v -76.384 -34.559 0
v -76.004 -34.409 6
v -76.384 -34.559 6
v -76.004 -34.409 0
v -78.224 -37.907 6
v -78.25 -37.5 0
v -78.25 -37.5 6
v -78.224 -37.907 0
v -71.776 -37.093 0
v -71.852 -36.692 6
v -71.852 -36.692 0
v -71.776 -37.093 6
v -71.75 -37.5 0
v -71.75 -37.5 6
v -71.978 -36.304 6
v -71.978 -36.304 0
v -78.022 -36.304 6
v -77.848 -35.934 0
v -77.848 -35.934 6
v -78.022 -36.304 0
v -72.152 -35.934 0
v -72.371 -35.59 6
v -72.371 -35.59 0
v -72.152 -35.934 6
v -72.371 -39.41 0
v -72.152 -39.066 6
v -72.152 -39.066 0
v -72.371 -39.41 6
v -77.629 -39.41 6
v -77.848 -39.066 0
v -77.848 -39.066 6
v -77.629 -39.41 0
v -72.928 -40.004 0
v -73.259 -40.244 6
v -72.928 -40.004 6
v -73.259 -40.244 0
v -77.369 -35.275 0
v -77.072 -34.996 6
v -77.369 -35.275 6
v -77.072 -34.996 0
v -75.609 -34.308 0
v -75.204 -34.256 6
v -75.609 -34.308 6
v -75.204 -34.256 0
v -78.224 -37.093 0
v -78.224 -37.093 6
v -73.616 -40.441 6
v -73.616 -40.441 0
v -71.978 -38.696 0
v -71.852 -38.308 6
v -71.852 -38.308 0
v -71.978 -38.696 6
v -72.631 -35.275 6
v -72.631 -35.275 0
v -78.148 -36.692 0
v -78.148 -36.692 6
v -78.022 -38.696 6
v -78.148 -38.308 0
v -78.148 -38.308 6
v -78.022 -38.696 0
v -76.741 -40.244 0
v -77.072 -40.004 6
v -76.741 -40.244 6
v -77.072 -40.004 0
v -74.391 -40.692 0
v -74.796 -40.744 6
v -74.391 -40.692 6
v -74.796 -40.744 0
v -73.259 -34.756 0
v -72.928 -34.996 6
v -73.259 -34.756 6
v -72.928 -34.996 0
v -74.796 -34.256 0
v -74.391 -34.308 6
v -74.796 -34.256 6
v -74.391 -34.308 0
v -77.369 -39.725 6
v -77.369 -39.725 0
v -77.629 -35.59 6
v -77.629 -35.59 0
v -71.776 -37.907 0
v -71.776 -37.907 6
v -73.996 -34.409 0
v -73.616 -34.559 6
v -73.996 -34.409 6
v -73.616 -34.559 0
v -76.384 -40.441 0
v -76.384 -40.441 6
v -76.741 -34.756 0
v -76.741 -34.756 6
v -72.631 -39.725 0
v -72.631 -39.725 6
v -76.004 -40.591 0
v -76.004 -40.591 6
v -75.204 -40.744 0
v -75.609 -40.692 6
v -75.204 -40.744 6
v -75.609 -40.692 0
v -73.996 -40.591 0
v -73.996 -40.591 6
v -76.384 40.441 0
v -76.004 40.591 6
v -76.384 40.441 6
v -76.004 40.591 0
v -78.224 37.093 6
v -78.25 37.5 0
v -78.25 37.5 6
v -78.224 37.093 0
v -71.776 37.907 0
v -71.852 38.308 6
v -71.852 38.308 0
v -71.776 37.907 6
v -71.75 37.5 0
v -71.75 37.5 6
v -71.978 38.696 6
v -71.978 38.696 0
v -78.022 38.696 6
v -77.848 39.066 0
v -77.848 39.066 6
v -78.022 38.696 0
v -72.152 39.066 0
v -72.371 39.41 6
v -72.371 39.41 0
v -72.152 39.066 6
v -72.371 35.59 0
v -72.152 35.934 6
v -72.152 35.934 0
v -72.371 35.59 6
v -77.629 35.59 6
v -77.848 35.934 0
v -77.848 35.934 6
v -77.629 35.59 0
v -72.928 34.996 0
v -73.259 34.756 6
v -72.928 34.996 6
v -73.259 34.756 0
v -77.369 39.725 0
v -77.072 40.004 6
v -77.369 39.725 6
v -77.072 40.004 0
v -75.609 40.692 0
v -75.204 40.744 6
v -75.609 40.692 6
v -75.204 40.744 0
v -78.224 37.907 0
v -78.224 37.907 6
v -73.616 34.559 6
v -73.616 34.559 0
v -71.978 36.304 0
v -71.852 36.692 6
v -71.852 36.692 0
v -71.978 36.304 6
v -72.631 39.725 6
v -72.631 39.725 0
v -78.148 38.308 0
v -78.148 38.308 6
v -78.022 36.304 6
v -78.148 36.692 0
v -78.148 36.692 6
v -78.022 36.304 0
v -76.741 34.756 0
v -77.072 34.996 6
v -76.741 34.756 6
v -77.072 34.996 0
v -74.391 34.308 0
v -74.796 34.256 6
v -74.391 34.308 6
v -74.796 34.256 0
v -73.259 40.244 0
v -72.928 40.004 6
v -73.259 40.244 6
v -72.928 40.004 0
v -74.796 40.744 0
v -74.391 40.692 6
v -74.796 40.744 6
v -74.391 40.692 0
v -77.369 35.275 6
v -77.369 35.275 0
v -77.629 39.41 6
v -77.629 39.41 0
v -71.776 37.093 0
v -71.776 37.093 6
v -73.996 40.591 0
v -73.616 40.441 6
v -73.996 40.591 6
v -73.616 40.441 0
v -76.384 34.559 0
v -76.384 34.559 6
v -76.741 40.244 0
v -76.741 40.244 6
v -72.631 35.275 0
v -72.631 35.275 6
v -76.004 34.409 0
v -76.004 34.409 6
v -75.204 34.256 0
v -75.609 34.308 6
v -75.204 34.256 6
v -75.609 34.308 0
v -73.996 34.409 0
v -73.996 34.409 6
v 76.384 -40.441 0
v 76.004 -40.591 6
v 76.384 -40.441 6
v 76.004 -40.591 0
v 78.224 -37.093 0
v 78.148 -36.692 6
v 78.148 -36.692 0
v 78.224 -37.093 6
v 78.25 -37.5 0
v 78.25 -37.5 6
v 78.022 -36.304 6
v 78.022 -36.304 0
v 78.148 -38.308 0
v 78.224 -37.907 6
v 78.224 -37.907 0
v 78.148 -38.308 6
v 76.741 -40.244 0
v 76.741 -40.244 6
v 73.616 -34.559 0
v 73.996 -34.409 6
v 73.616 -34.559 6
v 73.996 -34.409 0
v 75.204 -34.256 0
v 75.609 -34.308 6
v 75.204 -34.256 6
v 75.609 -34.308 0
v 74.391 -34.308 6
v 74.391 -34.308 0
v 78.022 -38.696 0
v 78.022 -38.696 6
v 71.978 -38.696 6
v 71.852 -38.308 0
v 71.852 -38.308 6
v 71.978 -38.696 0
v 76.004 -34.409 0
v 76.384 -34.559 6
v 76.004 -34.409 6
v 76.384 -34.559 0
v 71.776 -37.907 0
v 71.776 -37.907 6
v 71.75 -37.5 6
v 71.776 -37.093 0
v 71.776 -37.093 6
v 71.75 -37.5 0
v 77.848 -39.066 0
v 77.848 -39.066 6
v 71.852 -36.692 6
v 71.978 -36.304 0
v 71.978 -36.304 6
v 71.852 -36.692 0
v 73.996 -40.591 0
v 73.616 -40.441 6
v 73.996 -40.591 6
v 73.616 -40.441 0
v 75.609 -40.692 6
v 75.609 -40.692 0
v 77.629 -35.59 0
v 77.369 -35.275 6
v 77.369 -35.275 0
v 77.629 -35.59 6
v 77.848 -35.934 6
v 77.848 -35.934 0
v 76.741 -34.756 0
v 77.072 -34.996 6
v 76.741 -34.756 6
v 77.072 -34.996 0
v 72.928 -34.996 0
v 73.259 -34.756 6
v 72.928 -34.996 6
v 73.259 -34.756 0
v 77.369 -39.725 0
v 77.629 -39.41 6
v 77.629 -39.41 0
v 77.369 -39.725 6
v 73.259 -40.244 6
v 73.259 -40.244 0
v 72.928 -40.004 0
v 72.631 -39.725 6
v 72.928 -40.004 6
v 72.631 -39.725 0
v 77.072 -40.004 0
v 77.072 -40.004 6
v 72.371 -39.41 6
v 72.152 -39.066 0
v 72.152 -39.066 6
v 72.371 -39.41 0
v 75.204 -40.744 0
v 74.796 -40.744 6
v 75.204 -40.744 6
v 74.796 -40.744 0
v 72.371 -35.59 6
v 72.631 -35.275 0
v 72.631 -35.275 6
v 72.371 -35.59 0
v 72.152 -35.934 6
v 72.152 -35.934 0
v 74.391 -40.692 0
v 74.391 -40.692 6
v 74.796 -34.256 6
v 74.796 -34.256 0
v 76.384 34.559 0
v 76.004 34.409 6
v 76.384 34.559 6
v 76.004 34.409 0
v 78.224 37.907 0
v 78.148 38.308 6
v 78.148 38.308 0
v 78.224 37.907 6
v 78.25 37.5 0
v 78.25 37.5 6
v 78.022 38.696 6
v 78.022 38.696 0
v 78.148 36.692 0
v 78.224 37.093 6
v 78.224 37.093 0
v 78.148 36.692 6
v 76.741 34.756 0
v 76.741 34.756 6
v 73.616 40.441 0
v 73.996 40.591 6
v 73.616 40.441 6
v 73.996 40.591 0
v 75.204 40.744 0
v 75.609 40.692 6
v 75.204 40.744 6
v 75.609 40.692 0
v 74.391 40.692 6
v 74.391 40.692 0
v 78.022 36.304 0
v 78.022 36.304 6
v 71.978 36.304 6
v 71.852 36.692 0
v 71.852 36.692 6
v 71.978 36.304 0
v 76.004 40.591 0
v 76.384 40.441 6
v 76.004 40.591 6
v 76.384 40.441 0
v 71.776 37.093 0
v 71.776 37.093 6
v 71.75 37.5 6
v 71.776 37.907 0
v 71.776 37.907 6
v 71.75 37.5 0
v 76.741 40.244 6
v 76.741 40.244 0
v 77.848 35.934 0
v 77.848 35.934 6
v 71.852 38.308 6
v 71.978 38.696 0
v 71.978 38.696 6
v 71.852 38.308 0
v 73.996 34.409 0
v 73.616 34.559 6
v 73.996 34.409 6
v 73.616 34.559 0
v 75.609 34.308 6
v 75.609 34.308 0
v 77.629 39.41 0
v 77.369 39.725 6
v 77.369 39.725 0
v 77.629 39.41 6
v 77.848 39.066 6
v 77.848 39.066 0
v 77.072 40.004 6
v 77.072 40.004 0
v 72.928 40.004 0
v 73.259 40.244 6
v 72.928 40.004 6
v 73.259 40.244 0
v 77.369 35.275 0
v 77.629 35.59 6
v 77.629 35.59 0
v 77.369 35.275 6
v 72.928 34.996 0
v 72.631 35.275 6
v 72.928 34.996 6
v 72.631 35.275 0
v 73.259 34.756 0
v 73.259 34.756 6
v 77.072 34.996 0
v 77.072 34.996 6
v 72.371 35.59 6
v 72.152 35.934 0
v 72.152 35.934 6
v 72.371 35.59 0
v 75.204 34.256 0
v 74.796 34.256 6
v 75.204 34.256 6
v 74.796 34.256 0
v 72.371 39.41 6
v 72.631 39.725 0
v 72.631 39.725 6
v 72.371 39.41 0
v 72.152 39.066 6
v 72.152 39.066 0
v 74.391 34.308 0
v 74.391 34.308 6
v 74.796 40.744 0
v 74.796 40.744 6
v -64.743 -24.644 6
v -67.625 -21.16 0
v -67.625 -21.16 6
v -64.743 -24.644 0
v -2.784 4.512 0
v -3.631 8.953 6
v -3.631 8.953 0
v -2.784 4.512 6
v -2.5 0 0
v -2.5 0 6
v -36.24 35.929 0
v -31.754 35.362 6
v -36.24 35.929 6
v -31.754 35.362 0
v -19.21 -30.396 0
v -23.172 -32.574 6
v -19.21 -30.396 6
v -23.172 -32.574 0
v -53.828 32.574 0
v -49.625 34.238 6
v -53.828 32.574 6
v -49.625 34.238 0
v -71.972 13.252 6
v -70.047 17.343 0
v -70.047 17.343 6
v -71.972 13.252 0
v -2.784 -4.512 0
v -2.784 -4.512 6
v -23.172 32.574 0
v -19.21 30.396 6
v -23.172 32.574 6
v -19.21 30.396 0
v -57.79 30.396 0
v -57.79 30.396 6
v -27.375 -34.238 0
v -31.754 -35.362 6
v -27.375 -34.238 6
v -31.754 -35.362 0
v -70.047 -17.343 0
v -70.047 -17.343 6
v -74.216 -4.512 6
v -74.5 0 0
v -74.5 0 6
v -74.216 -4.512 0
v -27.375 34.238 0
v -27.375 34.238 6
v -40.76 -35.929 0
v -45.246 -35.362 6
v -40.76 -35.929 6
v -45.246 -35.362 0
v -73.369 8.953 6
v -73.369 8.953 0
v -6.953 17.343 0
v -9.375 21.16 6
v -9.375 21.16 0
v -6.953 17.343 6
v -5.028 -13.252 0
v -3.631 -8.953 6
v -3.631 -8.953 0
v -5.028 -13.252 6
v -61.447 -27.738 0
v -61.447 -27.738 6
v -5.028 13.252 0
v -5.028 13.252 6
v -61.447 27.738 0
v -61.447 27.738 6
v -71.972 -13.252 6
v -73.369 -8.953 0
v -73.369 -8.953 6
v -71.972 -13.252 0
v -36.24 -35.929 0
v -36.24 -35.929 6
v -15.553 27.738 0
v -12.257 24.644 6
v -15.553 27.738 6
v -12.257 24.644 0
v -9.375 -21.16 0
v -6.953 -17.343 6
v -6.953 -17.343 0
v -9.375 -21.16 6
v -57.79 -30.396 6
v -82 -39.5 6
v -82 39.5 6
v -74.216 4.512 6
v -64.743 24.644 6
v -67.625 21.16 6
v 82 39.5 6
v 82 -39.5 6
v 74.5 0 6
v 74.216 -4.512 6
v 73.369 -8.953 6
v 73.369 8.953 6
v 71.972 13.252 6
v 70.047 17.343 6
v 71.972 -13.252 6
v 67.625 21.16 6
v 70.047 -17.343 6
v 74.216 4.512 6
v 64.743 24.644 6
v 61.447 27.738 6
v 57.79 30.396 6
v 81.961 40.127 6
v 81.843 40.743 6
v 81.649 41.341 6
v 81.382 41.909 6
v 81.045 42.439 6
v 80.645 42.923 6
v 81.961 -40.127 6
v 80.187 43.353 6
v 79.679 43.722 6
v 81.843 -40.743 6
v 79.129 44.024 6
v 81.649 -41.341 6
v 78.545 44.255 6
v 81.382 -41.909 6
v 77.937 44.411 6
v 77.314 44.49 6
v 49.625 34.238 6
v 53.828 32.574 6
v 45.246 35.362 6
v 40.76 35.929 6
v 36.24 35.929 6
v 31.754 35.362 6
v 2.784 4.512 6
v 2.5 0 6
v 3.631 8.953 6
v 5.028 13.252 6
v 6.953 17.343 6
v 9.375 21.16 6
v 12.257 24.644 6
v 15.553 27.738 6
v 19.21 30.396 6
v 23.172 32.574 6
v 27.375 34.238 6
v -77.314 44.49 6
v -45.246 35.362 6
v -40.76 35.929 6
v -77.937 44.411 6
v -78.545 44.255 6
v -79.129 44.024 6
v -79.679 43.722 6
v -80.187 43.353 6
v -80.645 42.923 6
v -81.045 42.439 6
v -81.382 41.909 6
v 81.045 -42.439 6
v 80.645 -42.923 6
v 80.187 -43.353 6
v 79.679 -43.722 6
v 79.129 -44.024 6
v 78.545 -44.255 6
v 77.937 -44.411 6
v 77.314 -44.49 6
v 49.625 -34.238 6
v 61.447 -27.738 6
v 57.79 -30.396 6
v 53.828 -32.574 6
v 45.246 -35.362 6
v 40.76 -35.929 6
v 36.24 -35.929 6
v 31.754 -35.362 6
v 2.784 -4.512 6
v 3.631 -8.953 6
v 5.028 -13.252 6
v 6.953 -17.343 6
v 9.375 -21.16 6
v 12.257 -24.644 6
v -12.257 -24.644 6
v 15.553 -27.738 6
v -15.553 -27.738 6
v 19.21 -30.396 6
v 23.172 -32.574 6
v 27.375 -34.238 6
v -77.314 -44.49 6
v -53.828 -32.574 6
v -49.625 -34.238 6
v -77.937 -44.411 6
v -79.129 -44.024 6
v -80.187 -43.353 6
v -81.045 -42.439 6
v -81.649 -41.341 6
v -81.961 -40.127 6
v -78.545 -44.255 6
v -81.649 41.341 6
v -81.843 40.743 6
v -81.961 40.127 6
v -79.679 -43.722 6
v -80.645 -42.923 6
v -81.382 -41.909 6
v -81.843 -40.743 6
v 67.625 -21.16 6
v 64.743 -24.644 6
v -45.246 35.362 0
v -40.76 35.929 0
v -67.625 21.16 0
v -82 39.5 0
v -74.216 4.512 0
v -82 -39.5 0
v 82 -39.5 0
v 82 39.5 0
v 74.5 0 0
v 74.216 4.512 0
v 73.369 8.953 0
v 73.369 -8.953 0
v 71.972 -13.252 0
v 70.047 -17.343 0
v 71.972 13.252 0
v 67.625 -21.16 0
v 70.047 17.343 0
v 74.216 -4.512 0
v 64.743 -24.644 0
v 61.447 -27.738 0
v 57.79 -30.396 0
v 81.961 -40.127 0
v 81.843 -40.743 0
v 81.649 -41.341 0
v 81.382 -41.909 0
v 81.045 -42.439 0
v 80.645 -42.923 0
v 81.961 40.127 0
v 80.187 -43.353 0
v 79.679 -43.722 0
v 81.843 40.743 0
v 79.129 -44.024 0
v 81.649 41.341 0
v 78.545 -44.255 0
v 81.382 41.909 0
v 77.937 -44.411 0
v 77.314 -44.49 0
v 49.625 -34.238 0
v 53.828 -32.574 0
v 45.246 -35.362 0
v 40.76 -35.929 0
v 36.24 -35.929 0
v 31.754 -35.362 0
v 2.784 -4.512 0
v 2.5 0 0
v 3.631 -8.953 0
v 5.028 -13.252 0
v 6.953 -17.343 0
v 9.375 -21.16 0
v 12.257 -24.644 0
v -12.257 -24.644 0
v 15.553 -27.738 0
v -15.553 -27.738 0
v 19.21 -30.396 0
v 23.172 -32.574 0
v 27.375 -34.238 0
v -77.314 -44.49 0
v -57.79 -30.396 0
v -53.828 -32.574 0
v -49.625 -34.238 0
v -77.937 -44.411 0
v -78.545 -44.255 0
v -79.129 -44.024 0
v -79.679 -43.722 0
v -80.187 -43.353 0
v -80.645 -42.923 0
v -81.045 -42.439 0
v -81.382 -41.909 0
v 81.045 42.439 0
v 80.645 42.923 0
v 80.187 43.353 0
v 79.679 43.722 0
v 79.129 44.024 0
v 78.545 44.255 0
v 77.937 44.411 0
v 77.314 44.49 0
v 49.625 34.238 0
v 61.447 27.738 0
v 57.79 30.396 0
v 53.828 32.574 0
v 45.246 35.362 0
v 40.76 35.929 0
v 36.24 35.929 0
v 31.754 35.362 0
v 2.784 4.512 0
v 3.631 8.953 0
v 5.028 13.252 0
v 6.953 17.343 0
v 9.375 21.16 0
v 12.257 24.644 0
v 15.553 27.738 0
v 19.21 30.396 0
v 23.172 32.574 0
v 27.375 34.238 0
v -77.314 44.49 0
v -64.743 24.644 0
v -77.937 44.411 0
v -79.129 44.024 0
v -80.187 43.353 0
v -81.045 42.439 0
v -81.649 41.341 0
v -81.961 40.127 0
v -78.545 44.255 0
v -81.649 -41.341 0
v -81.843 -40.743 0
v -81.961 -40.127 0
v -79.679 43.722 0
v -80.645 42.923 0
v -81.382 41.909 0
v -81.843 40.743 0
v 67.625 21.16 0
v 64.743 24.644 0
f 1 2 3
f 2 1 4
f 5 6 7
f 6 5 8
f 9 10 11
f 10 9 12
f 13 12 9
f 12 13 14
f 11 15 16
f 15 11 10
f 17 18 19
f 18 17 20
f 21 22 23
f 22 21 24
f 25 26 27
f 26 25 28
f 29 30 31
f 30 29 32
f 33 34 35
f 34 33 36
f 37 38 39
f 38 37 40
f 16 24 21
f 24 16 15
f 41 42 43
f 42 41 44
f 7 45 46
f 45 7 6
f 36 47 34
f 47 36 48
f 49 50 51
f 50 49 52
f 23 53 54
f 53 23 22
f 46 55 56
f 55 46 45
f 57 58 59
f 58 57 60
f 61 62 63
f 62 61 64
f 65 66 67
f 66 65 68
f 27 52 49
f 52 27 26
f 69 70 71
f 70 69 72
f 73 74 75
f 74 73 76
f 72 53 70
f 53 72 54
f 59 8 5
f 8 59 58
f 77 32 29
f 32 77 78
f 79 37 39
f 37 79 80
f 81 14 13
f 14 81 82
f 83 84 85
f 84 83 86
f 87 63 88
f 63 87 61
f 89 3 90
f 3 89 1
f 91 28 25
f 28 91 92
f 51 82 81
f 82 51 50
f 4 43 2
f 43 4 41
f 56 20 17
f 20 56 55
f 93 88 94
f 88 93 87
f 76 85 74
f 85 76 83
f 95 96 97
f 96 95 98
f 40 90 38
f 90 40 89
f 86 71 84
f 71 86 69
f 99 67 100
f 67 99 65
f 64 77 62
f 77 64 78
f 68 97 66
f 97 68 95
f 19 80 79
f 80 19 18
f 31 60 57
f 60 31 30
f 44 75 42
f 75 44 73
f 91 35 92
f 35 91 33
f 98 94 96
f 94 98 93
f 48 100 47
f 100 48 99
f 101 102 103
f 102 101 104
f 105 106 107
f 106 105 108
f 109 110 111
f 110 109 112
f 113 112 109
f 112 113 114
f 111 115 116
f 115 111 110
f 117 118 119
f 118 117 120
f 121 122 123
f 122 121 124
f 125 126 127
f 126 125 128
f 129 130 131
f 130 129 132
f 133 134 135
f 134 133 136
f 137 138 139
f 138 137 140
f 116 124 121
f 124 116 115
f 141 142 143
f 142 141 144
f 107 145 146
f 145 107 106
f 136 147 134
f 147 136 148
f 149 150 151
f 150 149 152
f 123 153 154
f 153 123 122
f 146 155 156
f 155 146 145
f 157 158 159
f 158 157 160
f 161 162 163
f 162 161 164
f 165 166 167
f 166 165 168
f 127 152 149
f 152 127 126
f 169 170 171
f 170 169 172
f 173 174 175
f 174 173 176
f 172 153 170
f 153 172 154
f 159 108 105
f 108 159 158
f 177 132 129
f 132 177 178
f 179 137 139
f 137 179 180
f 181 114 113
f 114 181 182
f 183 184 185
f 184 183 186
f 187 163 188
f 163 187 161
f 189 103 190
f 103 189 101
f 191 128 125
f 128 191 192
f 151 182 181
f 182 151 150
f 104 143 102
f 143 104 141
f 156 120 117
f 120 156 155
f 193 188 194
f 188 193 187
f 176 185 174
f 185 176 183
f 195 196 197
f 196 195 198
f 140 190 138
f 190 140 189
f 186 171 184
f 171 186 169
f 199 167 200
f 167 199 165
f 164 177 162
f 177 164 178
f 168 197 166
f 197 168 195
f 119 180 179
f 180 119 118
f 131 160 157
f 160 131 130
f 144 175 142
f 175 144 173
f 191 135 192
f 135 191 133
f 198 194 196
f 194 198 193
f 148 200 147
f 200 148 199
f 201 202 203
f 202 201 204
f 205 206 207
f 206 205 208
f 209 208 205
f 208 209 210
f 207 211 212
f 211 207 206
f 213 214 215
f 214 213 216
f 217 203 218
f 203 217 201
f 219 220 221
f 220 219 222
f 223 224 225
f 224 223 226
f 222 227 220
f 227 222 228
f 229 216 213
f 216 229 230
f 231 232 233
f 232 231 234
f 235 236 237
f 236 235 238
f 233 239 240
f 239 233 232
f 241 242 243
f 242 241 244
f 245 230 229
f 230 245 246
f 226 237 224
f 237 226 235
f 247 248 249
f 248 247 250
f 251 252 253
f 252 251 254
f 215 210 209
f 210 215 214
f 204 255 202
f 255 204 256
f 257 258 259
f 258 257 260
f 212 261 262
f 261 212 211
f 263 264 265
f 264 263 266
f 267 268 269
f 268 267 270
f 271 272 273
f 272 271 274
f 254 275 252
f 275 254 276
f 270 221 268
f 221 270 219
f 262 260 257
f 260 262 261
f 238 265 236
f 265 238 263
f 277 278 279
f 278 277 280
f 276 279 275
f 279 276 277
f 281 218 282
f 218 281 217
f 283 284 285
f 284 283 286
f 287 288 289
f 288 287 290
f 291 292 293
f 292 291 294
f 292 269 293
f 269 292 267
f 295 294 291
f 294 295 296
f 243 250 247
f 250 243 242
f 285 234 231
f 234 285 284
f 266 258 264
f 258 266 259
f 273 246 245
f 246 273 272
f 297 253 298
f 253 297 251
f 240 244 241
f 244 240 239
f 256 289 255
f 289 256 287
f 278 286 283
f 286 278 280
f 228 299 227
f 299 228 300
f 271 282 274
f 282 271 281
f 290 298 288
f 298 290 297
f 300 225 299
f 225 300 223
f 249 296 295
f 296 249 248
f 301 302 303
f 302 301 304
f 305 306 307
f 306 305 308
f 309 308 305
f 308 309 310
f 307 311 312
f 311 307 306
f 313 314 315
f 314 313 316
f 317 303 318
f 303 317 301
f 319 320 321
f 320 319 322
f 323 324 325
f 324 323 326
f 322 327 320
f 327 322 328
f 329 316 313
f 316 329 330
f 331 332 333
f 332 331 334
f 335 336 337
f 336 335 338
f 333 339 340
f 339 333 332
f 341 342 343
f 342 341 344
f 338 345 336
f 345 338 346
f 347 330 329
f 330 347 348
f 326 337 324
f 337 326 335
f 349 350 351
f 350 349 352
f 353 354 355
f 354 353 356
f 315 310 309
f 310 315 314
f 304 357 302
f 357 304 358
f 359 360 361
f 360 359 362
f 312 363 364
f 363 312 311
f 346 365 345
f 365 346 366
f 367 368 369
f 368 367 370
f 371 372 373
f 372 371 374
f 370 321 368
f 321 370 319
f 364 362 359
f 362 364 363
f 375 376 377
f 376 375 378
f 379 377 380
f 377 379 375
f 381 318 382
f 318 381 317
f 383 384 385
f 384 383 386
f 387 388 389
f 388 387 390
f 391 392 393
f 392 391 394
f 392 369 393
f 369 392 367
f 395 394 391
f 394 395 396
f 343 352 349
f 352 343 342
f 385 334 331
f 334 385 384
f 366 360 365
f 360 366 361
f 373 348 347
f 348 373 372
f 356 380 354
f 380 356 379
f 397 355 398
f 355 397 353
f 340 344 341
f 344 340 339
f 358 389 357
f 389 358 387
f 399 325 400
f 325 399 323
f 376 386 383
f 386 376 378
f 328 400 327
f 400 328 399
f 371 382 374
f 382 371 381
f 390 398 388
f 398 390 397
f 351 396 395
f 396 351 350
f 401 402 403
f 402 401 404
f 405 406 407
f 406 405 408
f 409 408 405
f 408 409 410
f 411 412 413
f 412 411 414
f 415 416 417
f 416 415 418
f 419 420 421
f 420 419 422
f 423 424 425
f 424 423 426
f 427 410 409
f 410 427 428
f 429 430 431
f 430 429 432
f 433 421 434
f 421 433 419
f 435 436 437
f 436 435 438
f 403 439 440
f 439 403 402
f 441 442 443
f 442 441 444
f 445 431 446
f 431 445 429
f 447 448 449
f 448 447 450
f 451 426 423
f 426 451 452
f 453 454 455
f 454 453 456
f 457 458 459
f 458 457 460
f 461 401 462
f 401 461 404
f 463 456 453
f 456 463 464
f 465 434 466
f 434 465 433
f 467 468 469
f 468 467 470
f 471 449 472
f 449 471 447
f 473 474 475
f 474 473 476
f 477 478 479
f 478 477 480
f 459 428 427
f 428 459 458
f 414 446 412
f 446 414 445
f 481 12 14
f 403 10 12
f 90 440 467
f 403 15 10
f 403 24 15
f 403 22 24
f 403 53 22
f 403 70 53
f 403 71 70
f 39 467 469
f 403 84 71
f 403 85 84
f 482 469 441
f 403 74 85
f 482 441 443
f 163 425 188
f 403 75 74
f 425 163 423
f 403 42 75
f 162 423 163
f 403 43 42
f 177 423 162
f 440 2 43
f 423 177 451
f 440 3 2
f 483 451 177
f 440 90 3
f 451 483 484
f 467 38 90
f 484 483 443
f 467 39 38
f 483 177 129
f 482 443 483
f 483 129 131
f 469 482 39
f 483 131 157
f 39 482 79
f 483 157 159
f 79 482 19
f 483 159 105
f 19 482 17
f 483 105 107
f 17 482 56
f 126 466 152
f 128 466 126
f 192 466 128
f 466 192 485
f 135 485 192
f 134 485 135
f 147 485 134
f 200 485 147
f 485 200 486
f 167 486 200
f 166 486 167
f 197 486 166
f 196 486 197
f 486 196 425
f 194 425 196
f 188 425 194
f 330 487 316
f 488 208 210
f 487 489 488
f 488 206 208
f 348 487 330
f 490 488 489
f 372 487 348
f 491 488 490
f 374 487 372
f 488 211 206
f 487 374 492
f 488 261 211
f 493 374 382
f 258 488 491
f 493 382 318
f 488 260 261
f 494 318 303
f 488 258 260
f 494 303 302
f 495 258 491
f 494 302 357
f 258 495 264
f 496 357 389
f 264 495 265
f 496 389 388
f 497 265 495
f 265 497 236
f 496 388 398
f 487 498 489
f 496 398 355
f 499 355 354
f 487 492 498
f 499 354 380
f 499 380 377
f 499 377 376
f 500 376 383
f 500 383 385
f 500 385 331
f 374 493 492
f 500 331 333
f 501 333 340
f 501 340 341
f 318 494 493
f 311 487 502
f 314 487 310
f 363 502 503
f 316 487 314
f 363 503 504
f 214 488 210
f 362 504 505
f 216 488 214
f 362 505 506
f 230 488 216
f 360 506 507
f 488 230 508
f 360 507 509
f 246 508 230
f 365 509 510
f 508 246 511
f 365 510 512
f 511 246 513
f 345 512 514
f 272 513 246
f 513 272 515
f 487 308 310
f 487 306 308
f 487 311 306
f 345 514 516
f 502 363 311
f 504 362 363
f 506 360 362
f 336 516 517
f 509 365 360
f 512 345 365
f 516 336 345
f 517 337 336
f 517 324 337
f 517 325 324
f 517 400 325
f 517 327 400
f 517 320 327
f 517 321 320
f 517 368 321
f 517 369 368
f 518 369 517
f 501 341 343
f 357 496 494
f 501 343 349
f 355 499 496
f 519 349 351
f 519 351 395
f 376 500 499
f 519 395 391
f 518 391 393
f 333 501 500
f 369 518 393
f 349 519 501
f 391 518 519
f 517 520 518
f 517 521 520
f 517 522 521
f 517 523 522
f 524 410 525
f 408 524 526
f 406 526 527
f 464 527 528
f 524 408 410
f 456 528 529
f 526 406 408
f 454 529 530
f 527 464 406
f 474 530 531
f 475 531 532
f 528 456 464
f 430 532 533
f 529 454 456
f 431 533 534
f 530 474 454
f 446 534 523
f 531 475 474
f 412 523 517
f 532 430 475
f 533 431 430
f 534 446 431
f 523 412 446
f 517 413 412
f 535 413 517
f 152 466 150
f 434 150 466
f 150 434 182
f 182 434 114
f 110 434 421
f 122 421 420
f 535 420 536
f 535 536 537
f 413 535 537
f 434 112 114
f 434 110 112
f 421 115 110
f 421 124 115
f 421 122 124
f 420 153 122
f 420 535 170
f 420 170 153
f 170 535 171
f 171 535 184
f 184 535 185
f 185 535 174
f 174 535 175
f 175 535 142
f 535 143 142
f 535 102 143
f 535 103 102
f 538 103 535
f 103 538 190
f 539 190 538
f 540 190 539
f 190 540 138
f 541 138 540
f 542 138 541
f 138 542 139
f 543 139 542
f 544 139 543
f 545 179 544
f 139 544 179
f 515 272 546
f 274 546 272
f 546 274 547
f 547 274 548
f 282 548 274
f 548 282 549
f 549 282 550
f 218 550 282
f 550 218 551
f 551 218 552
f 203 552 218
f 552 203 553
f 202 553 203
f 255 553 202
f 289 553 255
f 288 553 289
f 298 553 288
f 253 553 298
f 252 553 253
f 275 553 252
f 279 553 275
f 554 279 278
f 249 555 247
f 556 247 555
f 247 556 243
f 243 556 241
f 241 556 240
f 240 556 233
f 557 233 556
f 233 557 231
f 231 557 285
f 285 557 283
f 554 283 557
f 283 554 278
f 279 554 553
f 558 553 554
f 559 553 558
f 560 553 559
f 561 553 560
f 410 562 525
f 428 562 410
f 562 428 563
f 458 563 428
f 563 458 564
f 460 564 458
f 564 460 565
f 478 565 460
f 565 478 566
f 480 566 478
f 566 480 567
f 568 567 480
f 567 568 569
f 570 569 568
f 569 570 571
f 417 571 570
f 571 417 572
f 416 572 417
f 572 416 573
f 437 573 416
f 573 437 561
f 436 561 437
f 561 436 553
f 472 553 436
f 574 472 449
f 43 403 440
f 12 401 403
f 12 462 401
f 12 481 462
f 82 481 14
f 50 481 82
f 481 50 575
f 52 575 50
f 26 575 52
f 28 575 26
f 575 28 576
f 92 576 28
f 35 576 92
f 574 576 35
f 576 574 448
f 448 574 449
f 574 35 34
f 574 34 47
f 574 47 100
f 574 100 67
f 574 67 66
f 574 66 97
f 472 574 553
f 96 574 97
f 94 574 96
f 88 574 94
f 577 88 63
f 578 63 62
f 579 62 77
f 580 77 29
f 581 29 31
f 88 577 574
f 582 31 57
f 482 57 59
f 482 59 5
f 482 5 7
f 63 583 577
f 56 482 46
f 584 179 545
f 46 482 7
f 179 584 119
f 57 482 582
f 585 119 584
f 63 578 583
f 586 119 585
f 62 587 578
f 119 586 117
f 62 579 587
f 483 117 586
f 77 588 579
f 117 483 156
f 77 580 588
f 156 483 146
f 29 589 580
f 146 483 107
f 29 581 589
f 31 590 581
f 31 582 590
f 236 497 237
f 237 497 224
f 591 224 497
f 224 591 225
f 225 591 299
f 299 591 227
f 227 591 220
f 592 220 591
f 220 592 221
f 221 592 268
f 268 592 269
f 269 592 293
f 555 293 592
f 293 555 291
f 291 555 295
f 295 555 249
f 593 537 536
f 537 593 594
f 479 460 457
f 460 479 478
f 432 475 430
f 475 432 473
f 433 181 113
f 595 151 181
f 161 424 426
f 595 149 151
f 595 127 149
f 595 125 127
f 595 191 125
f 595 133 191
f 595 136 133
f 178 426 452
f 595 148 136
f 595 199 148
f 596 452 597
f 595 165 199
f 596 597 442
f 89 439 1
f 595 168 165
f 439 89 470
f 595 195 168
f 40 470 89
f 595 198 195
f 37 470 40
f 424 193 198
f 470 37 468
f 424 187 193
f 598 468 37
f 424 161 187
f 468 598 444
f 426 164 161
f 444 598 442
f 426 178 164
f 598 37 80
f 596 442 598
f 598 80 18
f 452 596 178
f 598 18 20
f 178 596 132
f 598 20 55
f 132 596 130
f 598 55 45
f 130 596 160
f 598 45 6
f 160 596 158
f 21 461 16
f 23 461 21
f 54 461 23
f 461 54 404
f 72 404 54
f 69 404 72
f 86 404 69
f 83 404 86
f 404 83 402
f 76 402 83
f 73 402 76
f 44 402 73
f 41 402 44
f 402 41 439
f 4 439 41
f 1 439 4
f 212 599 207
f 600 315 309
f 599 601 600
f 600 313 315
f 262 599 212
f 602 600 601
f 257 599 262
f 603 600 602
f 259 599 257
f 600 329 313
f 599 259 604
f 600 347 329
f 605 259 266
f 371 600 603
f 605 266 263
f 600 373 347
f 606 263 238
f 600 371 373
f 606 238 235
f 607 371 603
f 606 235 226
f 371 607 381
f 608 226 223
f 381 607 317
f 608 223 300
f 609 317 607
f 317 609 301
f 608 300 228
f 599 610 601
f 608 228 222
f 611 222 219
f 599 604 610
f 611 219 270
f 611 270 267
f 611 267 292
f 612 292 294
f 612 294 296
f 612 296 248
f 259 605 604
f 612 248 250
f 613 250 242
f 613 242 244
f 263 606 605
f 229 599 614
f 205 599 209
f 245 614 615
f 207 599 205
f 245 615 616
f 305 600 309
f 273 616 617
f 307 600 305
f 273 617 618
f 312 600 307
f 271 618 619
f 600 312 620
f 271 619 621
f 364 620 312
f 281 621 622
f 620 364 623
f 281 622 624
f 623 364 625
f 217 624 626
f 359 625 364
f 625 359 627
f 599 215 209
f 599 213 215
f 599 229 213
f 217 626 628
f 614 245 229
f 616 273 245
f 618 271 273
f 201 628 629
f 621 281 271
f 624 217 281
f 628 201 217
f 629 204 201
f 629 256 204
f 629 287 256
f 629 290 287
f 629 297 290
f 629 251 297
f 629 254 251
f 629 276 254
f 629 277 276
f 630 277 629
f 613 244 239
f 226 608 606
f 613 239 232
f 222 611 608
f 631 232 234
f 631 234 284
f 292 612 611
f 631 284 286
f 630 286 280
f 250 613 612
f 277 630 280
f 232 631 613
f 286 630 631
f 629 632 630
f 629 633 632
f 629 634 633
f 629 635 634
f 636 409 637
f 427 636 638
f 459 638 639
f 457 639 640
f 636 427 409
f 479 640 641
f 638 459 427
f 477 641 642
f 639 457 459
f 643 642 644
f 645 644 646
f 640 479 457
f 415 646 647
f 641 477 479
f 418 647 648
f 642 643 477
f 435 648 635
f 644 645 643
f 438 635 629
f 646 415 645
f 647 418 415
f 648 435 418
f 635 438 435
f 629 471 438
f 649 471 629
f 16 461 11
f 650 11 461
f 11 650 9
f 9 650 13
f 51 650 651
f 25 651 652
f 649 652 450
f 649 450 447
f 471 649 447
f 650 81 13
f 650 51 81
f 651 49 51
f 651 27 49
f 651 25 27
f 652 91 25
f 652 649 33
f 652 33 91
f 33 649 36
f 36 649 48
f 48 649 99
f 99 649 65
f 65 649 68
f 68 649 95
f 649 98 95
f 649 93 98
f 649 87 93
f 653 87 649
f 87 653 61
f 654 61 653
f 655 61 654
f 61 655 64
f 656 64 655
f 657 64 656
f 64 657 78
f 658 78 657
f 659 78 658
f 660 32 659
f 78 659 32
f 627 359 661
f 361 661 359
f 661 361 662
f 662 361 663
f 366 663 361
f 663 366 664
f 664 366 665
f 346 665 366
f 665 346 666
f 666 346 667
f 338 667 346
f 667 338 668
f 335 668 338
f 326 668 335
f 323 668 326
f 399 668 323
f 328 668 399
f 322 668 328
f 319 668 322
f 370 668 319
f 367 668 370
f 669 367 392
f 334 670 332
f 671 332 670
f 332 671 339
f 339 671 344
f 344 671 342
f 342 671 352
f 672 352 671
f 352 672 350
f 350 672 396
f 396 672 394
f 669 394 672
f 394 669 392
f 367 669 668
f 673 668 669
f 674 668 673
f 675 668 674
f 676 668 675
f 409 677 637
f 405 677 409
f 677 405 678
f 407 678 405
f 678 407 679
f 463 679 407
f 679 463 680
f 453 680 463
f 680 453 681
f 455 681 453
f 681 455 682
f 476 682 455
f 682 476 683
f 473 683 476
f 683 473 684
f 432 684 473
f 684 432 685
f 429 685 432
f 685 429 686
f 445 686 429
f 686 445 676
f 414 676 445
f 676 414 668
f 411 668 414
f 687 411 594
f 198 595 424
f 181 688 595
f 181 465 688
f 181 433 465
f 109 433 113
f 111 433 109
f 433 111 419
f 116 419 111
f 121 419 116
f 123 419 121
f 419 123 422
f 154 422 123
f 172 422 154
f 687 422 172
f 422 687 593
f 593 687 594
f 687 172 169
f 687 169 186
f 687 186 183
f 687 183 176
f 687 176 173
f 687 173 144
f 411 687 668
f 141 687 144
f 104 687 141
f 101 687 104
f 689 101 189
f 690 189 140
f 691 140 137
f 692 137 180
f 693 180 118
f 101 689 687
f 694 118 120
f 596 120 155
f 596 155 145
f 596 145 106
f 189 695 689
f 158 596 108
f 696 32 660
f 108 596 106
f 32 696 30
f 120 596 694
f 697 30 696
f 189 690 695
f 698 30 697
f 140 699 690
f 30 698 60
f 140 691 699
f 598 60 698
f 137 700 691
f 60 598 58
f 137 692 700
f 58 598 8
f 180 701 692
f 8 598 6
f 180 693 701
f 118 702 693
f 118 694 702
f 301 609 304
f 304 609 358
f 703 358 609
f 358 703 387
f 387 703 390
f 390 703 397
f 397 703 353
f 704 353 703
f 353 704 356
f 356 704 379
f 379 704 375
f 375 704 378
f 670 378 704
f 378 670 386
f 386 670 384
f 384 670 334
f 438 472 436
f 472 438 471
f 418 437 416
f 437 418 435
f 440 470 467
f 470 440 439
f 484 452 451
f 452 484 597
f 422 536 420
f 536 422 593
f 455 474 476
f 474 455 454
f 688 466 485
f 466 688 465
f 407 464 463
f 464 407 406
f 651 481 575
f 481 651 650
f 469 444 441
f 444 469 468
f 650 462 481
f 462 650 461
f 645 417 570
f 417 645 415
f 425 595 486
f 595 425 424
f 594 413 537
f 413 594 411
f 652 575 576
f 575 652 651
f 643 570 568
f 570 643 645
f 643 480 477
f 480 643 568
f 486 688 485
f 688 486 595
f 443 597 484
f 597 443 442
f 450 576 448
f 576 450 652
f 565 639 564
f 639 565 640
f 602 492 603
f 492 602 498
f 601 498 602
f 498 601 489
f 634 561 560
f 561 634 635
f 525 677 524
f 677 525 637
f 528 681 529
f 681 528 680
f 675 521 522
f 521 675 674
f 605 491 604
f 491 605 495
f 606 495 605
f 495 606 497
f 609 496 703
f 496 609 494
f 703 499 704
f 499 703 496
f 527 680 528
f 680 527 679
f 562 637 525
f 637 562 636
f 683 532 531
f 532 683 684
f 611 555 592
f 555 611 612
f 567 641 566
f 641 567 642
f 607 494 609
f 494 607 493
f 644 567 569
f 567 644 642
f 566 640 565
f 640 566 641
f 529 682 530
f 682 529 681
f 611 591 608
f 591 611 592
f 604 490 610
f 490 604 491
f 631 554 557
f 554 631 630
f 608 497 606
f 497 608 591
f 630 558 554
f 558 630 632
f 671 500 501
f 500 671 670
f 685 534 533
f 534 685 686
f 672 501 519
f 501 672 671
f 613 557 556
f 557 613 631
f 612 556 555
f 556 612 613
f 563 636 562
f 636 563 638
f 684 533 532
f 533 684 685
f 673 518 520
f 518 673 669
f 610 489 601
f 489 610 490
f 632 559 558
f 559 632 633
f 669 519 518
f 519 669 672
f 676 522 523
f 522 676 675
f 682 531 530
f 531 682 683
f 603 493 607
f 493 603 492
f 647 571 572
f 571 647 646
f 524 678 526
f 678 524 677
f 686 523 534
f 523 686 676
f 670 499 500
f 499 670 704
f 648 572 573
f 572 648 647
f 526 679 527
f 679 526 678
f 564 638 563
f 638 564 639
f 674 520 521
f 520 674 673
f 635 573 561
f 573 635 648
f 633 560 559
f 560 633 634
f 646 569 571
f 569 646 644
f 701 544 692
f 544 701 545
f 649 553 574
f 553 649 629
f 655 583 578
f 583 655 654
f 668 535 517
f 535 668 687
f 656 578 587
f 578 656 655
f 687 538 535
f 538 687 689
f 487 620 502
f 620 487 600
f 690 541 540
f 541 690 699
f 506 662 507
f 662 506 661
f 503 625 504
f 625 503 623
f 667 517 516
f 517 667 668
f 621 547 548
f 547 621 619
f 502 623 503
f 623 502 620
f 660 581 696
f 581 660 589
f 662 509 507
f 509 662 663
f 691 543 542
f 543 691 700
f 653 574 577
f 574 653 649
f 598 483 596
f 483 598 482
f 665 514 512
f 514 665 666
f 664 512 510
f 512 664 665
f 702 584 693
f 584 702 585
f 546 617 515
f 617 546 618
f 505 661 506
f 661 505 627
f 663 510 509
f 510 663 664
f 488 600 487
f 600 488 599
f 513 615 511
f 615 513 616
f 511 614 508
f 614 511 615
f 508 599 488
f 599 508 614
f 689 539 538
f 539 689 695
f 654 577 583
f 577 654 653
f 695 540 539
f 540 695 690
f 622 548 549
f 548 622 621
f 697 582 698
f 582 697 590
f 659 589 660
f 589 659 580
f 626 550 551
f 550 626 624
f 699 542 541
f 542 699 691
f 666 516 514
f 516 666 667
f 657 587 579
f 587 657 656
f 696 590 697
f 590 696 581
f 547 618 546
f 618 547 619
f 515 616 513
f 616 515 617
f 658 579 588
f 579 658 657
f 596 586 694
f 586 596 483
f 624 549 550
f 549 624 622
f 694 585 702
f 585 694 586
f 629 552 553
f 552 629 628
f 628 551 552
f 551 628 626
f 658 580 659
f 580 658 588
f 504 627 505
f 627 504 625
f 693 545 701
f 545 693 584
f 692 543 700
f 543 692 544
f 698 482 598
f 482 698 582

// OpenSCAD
$fn = 50;


difference() {
	union() {
		hull() {
			translate(v = [-77.0000000000, 39.5000000000, 0]) {
				cylinder(h = 6, r = 5);
			}
			translate(v = [77.0000000000, 39.5000000000, 0]) {
				cylinder(h = 6, r = 5);
			}
			translate(v = [-77.0000000000, -39.5000000000, 0]) {
				cylinder(h = 6, r = 5);
			}
			translate(v = [77.0000000000, -39.5000000000, 0]) {
				cylinder(h = 6, r = 5);
			}
		}
	}
	union() {
		#translate(v = [-75.0000000000, -37.5000000000, -100.0000000000]) {
			cylinder(h = 200, r = 3.2500000000);
		}
		#translate(v = [-75.0000000000, 37.5000000000, -100.0000000000]) {
			cylinder(h = 200, r = 3.2500000000);
		}
		#translate(v = [75.0000000000, -37.5000000000, -100.0000000000]) {
			cylinder(h = 200, r = 3.2500000000);
		}
		#translate(v = [75.0000000000, 37.5000000000, -100.0000000000]) {
			cylinder(h = 200, r = 3.2500000000);
		}
		#translate(v = [-38.5000000000, 0, 0]) {
			cylinder(h = 6, r = 36.0000000000);
		}
		#translate(v = [38.5000000000, 0, 0]) {
			cylinder(h = 6, r = 36.0000000000);
		}
	}
}
